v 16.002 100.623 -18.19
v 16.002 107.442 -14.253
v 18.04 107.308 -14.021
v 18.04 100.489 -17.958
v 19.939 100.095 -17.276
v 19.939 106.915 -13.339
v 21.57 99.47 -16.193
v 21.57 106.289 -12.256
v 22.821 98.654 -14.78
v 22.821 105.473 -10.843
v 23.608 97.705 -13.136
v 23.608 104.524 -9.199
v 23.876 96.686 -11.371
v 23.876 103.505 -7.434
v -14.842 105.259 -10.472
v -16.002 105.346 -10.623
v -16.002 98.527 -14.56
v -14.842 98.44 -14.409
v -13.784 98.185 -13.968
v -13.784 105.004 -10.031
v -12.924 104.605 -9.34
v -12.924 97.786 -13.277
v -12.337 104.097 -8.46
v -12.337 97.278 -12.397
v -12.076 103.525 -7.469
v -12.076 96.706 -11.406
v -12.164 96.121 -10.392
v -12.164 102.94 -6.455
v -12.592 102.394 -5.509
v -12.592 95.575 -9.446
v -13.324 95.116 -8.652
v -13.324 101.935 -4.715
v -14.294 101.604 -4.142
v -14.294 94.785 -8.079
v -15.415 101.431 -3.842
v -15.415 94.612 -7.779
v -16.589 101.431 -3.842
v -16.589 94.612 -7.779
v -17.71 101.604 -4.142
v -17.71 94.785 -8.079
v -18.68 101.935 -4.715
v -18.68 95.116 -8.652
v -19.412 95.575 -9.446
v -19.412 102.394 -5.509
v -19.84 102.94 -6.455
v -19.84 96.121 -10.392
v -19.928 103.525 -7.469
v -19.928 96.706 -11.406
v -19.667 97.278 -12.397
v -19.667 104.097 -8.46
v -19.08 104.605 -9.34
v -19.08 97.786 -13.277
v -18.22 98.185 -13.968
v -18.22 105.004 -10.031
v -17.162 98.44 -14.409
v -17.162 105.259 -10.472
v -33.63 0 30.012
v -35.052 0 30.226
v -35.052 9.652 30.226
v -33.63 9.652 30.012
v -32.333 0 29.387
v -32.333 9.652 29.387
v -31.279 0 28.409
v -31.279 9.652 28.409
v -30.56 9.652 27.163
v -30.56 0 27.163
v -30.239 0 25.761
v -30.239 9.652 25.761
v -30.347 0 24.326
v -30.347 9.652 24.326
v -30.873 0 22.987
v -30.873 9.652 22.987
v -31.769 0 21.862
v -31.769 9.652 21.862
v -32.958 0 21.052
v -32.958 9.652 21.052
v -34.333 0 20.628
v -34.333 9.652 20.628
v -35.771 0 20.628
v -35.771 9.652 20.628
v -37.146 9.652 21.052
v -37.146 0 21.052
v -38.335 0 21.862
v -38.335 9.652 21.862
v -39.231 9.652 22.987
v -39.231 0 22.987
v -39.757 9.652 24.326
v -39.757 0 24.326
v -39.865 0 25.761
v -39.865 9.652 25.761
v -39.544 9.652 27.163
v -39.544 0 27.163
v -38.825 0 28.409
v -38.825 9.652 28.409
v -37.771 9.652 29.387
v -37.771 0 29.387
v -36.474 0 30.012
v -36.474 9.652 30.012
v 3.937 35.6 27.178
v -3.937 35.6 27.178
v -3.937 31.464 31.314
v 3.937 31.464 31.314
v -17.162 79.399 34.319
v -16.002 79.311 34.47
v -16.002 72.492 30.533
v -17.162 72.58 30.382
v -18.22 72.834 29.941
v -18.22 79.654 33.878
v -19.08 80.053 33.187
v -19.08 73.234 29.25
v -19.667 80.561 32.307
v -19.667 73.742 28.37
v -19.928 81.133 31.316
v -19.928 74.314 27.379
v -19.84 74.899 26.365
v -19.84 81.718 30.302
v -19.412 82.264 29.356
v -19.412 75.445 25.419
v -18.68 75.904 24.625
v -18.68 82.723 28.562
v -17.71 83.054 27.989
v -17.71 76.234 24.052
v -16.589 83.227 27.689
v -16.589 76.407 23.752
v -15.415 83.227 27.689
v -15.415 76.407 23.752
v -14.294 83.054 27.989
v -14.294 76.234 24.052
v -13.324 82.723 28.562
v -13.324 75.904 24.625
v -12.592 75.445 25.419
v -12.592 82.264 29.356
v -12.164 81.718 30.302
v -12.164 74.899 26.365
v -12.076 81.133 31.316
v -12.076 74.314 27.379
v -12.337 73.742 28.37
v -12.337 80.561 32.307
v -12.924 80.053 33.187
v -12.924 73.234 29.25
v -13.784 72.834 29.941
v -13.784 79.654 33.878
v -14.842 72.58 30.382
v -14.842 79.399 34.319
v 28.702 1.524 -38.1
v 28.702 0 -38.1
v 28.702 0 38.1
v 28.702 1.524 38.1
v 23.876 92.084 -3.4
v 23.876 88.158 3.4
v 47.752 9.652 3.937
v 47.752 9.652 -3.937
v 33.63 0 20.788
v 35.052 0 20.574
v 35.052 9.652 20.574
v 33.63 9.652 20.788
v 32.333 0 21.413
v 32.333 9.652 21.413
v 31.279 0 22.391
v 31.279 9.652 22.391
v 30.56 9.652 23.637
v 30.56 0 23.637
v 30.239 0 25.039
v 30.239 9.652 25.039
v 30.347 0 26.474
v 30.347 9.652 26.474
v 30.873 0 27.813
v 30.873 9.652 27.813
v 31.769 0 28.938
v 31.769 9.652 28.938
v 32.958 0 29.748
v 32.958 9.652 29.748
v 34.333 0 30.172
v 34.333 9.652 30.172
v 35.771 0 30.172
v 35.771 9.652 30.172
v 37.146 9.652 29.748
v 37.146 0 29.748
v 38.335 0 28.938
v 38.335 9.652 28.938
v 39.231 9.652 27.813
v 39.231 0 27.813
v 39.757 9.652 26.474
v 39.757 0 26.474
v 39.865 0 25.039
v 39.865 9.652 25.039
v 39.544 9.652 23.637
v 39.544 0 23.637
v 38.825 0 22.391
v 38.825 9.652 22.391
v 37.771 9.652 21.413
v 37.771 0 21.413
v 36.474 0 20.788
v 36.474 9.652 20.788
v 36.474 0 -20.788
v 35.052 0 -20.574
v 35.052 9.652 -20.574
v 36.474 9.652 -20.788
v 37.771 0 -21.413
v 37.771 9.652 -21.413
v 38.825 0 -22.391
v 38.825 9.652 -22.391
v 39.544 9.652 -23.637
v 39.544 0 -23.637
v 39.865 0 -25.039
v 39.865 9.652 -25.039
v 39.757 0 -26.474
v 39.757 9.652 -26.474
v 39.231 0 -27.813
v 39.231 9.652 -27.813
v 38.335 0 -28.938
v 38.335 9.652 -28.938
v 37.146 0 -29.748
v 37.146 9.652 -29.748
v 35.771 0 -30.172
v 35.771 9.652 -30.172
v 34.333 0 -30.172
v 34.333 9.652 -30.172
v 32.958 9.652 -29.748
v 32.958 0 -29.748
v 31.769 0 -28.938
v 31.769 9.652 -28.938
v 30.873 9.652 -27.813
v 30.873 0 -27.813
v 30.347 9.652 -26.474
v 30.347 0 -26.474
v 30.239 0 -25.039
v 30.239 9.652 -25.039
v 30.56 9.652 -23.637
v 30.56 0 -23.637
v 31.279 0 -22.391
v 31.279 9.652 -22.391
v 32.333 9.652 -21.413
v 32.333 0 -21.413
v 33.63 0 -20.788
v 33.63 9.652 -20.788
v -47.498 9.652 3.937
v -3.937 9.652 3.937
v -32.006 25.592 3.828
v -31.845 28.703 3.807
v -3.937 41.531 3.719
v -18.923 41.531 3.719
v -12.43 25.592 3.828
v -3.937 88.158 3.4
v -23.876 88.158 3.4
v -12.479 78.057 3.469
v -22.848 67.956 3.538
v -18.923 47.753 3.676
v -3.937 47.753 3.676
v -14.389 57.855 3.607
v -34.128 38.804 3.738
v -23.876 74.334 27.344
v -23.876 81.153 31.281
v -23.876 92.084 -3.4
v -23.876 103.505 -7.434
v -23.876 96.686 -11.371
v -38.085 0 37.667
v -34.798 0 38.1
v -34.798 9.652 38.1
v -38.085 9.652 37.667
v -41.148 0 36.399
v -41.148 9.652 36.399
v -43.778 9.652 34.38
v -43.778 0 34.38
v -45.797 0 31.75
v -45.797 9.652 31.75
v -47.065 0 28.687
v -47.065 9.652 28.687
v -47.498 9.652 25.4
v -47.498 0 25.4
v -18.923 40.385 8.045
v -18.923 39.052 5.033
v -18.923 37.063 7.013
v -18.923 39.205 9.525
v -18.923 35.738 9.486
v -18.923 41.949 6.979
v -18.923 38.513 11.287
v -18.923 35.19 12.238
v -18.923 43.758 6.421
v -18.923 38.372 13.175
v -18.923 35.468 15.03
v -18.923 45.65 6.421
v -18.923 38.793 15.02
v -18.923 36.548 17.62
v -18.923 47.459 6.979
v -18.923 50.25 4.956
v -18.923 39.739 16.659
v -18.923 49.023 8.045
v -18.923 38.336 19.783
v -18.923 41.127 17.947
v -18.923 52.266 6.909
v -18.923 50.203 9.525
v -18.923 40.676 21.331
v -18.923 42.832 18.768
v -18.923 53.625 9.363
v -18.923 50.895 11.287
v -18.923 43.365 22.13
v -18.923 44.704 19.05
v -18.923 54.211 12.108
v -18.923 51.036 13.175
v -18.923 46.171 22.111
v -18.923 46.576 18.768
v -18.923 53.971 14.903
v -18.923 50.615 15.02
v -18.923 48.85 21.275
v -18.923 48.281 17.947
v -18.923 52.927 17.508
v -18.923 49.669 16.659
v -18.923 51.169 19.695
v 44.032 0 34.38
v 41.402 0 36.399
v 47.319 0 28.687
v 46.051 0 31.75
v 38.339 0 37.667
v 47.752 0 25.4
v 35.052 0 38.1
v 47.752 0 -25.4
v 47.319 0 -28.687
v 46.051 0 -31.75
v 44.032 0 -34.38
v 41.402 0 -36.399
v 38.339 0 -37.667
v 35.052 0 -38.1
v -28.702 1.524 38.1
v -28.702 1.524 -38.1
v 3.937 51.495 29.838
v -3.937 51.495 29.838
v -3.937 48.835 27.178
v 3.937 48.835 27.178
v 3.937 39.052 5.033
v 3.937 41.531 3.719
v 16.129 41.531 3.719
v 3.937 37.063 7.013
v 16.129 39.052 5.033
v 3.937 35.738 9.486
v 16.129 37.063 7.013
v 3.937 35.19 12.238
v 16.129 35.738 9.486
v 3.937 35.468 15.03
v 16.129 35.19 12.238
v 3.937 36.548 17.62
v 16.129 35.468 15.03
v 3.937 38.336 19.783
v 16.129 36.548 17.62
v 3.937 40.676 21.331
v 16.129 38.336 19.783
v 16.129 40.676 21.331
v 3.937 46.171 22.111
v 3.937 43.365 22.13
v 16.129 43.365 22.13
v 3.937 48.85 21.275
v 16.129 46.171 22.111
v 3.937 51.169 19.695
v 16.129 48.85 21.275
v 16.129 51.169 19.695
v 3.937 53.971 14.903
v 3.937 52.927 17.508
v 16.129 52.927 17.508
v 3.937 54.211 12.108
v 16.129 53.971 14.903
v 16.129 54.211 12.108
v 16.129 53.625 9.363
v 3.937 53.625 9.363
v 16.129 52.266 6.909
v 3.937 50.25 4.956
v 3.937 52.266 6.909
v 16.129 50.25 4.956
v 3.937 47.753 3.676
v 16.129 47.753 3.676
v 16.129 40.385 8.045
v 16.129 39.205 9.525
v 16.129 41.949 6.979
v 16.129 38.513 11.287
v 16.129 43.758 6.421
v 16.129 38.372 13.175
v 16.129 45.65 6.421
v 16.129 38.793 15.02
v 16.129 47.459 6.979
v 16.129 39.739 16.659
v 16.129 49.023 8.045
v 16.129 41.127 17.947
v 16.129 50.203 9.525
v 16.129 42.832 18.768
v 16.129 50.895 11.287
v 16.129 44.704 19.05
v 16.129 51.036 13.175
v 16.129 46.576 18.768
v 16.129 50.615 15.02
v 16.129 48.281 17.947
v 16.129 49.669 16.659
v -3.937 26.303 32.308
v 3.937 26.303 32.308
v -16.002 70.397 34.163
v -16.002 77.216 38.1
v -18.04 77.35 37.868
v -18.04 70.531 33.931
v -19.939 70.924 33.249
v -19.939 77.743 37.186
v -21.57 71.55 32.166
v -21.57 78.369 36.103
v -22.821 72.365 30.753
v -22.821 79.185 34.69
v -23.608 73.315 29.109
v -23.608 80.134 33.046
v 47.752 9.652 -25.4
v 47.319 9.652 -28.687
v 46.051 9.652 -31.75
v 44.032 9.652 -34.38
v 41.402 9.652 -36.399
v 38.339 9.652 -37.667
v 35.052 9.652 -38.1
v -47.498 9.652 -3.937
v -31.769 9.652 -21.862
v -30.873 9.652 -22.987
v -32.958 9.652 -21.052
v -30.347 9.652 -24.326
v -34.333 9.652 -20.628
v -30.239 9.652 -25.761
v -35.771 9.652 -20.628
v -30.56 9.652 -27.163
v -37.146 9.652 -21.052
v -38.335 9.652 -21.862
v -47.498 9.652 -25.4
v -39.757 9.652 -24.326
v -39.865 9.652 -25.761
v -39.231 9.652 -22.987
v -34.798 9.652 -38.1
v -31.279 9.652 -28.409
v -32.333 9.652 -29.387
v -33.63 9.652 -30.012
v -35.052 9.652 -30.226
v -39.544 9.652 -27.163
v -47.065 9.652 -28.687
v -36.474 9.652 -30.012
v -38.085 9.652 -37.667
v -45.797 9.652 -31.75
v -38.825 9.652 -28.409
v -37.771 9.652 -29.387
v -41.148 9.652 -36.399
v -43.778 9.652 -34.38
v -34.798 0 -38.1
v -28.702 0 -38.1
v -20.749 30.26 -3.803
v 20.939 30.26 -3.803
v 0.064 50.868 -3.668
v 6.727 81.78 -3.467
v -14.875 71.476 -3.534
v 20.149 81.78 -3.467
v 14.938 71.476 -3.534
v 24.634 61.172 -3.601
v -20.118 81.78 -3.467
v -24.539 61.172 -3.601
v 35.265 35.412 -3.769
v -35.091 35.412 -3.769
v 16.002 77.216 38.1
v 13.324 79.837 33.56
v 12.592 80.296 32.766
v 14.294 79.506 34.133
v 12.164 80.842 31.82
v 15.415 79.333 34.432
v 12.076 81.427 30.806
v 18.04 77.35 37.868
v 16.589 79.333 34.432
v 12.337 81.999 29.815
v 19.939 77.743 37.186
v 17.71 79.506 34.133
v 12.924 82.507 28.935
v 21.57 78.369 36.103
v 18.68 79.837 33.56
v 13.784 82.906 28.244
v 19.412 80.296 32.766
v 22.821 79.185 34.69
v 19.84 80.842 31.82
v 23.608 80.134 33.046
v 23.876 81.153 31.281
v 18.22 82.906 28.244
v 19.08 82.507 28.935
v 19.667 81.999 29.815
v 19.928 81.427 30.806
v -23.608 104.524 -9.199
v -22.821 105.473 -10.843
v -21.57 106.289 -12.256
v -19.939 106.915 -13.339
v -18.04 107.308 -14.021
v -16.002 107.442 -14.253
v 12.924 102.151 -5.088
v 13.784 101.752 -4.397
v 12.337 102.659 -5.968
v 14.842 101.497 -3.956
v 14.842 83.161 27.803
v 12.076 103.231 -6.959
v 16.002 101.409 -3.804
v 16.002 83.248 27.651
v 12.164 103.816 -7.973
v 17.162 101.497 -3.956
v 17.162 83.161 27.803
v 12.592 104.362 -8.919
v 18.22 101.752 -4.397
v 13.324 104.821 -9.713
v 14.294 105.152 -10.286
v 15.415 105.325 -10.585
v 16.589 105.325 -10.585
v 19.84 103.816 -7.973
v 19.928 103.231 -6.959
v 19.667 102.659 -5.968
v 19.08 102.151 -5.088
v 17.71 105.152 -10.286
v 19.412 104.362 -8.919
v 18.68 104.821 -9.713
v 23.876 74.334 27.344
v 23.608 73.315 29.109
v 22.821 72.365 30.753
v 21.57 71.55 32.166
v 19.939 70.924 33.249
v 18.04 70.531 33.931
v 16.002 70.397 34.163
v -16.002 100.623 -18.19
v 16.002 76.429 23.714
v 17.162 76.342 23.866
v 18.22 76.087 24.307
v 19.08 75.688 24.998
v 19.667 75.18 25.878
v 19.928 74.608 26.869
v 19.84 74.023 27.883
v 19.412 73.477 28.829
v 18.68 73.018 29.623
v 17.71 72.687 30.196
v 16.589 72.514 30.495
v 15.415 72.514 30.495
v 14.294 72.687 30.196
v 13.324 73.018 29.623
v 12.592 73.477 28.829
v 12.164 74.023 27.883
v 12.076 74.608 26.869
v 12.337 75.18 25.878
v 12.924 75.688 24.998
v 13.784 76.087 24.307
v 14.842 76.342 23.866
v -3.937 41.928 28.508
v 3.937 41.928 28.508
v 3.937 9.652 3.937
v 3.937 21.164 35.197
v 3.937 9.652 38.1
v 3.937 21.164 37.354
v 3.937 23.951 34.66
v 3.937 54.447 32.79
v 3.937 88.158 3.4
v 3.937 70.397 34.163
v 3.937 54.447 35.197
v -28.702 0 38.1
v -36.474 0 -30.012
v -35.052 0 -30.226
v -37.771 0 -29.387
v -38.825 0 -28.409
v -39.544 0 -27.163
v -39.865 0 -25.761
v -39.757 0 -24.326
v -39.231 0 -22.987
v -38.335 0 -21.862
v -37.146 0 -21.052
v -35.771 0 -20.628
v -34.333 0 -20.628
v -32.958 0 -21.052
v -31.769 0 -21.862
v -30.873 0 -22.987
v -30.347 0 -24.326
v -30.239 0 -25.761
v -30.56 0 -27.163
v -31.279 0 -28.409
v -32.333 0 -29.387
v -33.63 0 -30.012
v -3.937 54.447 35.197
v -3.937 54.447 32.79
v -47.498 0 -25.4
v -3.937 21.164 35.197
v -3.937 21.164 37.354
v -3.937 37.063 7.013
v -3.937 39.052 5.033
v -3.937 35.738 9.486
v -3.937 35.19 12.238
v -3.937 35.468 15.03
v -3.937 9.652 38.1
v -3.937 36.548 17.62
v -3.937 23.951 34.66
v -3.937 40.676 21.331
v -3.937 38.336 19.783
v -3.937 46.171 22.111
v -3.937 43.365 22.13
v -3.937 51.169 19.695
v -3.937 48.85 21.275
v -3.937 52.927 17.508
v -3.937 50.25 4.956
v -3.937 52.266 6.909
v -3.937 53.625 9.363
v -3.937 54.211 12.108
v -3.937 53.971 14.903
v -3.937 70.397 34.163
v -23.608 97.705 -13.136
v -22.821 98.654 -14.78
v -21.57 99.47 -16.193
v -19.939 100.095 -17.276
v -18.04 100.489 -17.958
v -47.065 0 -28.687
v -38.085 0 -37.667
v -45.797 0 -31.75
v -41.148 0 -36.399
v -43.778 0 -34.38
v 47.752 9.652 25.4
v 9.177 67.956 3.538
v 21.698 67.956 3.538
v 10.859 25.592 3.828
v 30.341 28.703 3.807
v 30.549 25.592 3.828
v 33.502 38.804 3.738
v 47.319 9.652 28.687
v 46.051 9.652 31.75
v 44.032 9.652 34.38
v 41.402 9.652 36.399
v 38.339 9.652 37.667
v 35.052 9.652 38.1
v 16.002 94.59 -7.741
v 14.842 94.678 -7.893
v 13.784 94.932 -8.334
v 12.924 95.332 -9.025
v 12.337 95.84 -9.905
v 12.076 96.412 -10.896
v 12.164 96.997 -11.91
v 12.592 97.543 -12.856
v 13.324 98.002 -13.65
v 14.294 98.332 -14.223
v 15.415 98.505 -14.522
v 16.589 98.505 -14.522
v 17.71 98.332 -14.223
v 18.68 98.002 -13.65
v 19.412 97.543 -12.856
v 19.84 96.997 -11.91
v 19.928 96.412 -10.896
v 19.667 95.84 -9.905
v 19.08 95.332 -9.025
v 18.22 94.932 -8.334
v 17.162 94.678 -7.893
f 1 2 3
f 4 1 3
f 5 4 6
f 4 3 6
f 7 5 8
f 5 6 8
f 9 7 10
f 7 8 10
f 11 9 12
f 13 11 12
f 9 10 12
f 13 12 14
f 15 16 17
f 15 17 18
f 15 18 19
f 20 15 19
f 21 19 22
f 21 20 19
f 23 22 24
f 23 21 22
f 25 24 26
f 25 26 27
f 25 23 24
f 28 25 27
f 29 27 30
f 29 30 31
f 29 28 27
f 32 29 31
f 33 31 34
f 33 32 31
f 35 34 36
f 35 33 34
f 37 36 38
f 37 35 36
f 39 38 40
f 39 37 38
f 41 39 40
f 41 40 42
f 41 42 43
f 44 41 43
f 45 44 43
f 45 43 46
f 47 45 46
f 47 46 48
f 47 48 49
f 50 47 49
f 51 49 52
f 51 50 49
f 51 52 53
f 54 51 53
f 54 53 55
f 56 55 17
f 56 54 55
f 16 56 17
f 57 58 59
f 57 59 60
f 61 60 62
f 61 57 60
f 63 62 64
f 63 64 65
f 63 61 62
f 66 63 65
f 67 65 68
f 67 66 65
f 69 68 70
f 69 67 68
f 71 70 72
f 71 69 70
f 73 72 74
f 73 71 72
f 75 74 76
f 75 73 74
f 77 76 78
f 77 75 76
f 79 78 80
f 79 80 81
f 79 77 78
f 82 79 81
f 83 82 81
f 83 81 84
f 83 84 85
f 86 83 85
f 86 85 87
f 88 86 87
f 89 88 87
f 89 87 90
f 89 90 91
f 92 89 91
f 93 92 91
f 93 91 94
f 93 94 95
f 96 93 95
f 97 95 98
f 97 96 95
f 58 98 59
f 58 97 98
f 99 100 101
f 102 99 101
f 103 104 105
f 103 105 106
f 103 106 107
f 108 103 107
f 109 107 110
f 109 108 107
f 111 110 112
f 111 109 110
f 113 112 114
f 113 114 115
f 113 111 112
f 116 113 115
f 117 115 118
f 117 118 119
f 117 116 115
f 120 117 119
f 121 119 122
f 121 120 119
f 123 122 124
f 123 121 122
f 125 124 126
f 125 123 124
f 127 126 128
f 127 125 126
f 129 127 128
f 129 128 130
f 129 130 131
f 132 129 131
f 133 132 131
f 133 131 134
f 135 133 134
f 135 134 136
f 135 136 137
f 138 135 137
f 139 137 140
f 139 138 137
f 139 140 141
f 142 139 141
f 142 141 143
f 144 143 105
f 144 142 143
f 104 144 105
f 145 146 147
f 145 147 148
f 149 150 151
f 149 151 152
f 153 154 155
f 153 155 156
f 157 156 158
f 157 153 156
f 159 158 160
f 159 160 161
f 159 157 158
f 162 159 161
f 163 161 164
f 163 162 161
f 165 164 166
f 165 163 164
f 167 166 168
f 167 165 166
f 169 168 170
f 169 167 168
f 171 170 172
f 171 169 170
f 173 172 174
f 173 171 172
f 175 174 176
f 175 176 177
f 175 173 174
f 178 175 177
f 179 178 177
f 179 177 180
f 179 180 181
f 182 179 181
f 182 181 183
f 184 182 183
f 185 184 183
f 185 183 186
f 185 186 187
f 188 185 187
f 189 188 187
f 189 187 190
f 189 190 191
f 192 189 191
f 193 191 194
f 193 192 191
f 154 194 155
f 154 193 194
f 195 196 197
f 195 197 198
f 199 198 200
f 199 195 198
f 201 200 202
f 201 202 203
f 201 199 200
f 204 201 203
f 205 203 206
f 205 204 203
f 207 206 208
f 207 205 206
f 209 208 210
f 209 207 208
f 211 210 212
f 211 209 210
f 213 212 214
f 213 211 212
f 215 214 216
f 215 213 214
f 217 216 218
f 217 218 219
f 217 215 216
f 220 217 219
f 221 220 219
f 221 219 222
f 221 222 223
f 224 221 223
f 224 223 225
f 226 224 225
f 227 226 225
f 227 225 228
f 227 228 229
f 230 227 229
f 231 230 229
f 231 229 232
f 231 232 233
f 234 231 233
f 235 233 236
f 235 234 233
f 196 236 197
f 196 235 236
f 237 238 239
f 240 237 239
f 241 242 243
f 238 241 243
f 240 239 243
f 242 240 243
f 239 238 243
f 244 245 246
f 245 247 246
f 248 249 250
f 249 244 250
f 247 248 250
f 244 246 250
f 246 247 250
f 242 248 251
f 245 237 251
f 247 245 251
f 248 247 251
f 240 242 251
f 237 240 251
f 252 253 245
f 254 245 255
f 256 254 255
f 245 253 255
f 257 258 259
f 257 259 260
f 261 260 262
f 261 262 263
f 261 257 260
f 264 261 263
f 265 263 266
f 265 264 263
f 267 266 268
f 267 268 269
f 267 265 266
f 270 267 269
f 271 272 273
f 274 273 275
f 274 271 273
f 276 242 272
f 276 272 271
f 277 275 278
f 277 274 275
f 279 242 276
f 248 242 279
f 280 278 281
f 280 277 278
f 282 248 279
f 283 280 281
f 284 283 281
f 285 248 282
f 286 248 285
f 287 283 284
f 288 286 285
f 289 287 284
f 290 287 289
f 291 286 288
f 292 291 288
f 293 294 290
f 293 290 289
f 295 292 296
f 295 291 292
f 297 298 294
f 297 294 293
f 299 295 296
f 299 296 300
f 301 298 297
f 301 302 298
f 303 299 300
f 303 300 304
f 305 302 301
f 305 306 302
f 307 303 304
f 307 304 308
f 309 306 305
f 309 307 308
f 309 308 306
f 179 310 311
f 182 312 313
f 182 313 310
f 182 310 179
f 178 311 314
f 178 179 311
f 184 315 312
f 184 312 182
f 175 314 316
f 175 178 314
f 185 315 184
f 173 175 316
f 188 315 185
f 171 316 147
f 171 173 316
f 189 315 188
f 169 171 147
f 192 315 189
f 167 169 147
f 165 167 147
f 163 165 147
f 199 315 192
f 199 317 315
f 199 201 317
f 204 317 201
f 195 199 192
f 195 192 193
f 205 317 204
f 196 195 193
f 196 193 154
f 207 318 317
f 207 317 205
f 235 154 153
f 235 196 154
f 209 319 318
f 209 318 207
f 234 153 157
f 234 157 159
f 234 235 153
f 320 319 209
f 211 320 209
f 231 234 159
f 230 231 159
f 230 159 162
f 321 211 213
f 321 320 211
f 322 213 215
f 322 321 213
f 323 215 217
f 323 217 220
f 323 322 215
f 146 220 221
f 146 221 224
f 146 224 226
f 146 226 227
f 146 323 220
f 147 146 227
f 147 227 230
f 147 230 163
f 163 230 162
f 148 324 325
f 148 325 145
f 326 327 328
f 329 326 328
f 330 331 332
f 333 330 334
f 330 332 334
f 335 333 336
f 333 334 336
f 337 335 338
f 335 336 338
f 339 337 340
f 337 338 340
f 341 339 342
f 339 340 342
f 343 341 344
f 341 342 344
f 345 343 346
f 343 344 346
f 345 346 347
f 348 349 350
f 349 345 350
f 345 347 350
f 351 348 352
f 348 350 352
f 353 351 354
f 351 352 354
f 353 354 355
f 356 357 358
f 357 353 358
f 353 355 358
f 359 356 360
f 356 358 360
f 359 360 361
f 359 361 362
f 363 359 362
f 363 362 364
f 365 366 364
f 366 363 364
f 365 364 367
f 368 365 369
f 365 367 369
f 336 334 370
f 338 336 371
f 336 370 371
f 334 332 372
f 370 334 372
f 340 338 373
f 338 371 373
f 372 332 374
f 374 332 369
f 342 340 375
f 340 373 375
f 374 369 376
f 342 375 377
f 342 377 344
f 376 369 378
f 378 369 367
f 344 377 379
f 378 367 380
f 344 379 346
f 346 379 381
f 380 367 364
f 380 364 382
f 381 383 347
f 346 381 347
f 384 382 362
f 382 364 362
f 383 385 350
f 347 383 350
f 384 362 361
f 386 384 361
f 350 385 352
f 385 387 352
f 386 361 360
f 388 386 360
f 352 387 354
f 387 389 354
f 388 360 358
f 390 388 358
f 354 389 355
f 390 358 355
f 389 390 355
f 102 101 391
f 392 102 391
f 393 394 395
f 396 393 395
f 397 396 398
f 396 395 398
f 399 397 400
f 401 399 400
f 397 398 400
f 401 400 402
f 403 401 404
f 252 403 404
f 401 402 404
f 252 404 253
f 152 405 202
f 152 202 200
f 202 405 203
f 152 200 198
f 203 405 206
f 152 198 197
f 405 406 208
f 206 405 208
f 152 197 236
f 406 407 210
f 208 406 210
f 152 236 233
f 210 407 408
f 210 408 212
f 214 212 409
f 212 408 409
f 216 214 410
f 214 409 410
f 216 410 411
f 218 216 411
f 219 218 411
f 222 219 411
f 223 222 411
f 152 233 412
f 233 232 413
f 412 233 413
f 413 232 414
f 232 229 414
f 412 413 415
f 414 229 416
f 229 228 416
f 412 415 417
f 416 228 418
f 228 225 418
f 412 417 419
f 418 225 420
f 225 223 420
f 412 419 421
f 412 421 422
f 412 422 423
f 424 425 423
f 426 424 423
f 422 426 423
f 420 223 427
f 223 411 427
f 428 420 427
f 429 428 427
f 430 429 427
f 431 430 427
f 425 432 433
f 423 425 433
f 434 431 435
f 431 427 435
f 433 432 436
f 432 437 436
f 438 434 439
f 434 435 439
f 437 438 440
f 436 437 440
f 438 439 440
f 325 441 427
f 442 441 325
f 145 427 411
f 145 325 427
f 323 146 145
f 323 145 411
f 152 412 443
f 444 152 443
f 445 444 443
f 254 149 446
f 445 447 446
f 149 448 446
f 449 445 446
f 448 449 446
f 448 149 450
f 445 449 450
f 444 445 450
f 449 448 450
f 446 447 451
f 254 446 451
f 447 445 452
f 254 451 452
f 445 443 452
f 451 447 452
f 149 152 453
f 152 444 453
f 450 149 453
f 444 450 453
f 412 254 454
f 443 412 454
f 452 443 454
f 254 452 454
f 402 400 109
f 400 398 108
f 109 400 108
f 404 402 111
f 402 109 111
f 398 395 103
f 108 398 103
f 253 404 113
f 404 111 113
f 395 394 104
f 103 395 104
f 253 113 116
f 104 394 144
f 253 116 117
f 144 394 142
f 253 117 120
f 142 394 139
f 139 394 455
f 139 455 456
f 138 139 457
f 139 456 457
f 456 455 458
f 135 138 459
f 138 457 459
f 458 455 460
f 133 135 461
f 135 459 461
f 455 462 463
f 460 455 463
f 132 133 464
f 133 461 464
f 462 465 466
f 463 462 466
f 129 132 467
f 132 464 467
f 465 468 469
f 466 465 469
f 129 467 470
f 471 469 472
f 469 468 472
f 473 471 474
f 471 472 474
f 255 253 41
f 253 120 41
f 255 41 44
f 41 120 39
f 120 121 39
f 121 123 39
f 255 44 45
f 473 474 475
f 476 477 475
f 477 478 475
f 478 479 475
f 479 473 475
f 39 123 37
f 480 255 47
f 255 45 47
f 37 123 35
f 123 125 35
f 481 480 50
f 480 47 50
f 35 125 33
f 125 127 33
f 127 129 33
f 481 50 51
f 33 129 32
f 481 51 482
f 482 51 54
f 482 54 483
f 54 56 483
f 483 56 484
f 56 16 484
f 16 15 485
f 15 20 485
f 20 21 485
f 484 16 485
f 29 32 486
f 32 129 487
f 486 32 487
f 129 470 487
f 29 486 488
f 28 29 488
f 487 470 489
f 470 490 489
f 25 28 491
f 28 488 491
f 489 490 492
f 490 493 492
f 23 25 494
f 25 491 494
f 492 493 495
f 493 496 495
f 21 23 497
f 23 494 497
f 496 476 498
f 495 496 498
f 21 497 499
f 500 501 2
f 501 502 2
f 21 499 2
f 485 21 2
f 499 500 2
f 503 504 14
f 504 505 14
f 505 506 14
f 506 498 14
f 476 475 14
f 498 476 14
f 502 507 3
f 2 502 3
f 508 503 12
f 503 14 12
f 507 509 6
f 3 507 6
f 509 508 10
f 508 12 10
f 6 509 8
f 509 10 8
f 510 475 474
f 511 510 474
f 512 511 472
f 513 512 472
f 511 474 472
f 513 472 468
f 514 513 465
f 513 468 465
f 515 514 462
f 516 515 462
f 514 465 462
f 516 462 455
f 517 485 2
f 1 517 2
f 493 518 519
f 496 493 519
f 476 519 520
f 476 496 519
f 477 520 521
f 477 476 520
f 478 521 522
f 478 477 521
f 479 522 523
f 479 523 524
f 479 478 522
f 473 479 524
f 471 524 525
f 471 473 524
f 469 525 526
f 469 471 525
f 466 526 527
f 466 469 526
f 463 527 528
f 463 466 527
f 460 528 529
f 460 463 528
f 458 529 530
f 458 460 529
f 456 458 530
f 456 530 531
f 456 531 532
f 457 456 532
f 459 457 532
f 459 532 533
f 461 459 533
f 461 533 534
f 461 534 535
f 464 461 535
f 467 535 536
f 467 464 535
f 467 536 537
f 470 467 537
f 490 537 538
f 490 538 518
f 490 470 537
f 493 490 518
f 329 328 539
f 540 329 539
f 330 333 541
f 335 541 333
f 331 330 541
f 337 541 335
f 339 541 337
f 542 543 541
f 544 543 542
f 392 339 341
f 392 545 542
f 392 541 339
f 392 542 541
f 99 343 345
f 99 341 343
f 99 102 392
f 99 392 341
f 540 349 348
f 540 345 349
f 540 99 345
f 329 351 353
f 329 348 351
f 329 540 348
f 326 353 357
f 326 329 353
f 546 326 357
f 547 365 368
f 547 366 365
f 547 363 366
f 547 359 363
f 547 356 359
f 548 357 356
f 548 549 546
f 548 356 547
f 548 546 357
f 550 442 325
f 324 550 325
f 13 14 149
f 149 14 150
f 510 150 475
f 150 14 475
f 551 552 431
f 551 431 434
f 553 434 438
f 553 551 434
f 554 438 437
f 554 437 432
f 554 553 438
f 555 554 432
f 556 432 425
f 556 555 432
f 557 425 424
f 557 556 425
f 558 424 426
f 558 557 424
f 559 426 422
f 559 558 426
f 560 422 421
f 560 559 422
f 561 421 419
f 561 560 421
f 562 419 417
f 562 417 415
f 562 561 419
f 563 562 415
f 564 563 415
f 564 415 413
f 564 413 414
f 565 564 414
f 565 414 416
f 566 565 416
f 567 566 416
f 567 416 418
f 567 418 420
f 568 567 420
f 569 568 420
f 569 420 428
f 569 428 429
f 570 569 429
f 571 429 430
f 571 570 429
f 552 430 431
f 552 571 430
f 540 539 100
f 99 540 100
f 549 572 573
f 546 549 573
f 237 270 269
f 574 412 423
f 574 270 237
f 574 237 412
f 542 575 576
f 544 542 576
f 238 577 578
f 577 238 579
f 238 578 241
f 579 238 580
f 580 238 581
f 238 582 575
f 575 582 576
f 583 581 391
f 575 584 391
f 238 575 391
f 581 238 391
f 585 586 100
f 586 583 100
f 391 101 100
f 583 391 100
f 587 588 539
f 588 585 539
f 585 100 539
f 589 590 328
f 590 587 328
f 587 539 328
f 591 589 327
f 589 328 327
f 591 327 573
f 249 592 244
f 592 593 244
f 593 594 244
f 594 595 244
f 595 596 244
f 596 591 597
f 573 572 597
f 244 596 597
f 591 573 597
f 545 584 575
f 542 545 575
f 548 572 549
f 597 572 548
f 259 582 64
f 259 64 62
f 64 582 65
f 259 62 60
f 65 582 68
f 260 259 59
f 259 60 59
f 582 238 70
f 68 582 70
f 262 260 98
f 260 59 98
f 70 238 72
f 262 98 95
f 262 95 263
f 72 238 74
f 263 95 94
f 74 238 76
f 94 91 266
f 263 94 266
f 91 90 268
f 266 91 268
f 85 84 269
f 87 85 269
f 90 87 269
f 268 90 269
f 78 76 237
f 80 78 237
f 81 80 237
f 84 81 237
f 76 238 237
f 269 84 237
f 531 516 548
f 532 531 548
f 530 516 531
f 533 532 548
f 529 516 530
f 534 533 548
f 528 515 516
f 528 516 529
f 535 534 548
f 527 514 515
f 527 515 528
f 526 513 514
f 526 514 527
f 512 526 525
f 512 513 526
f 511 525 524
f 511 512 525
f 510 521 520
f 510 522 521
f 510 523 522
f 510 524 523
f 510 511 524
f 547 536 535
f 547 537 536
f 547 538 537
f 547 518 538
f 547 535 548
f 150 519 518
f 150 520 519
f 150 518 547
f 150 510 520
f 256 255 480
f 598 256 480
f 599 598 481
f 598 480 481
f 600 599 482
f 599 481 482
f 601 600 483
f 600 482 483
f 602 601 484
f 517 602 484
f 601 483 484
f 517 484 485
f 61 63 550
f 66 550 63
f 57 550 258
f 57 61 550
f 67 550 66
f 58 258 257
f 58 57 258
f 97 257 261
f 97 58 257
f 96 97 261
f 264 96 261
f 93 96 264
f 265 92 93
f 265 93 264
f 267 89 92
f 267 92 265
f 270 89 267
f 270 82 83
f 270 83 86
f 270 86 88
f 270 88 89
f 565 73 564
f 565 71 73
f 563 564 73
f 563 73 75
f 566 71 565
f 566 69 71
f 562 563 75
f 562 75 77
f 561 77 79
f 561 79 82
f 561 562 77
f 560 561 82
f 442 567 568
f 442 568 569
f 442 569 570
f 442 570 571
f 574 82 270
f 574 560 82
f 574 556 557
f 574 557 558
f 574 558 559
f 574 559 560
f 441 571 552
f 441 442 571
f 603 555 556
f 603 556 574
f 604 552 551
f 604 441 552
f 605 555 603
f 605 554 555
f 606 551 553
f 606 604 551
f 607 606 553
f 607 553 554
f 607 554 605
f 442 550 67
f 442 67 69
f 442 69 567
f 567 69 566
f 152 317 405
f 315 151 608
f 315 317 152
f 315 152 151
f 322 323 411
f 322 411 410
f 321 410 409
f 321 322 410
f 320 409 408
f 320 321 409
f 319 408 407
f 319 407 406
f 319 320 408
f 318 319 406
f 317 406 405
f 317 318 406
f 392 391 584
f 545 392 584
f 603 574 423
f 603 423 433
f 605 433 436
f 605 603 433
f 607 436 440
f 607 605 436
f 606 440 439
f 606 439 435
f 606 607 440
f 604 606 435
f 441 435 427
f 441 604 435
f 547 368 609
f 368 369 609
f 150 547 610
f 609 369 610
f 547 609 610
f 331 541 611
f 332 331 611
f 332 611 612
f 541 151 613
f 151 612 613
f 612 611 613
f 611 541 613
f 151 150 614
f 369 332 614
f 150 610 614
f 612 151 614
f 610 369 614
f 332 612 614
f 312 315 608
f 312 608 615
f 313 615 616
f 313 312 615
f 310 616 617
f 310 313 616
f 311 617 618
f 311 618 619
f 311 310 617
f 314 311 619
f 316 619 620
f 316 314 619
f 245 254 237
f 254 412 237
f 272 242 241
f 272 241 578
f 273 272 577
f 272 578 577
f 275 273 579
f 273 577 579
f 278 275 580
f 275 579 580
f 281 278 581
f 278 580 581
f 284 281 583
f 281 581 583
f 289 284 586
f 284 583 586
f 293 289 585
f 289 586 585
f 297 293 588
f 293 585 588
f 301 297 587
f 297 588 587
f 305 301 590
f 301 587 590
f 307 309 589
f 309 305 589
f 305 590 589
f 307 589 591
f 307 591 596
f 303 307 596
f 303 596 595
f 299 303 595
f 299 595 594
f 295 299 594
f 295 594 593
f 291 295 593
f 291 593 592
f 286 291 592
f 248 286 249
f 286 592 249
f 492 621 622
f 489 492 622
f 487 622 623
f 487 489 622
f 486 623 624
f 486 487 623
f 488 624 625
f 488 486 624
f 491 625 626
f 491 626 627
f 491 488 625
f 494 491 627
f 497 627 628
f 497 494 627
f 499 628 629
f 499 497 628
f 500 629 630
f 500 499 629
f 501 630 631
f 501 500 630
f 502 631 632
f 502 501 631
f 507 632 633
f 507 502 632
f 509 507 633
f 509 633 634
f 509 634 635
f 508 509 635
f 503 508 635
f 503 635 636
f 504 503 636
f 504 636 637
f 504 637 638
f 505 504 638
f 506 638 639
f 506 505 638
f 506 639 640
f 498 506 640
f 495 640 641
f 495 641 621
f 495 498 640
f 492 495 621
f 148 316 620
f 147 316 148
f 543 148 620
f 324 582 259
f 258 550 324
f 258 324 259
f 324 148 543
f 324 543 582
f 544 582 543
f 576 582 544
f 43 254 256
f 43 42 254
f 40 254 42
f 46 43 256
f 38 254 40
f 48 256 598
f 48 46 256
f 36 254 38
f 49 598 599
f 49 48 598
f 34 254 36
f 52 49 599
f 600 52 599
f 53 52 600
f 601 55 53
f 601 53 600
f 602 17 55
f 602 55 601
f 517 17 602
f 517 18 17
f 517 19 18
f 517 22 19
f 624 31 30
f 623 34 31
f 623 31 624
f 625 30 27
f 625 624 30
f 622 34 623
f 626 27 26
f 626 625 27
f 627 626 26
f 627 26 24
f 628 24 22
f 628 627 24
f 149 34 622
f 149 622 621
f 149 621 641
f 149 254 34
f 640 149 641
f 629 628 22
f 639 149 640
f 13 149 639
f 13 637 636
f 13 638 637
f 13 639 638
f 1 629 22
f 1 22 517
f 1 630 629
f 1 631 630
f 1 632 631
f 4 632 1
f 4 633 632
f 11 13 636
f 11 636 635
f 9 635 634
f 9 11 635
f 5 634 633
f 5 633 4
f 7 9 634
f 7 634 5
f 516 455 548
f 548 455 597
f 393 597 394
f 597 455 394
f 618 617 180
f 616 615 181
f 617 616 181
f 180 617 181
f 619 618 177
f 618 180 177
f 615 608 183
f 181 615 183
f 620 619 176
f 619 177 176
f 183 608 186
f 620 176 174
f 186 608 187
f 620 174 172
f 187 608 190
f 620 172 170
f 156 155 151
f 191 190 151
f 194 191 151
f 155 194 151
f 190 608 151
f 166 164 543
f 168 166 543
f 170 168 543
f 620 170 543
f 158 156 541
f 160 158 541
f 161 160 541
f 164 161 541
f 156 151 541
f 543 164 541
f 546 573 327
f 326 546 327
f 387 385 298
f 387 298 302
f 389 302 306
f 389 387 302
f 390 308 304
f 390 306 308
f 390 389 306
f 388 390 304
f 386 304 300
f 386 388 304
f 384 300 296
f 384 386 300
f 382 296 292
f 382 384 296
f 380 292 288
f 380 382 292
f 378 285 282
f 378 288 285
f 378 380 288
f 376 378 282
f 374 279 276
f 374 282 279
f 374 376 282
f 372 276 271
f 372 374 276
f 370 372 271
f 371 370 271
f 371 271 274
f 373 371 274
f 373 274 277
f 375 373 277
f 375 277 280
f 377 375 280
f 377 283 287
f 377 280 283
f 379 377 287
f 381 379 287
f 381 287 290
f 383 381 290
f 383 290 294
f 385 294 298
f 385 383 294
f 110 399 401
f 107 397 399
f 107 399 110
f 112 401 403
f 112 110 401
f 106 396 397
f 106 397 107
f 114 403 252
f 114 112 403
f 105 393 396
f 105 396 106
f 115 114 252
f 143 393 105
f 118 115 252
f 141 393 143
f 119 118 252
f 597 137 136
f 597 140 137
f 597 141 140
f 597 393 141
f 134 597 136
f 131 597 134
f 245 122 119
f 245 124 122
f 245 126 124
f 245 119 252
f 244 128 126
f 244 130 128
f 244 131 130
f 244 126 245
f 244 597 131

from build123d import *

# Parameters (mm, degrees)
SKETCH2_R                = 4.826
BOSS_EXTRUDE1_DEPTH      = 9.652
CUT_EXTRUDE1_REACH       = 92.443
SKETCH4_W                = 57.404
SKETCH4_H                = 1.524
SKETCH7_R                = 3.937
BOSS_EXTRUDE2_DEPTH      = 7.874
RIB1_REACH               = 125.595
SKETCH11_WALL_W          = 310.061740512
SKETCH11_WALL_H          = 7.874
BOSS_EXTRUDE3_DEPTH      = 14.986
BOSS_EXTRUDE3_DEPTH_BACK = 20.066
SKETCH12_R               = 9.525
CUT_EXTRUDE2_DEPTH       = 126.168470882
CUT_EXTRUDE2_DEPTH_BACK  = 126.168470882
SKETCH12_3_R             = 6.35
CUT_EXTRUDE3_REACH       = 127.168


with BuildPart() as part:
    # Sketch2 → Boss-Extrude1 (new body)
    with BuildSketch(Plane(origin=(0, 0, 0), x_dir=(1, 0, 0), z_dir=(0, 1, 0))):
        with BuildLine():
            Line((35.052, -38.1), (-34.798, -38.1))
            ThreePointArc((-34.798, -38.1), (-43.778256121, -34.380256121), (-47.498, -25.4))
            Line((-47.498, -25.4), (-47.498, 25.4))
            ThreePointArc((-47.498, 25.4), (-43.778256121, 34.380256121), (-34.798, 38.1))
            Line((-34.798, 38.1), (35.052, 38.1))
            ThreePointArc((35.052, 38.1), (44.032256121, 34.380256121), (47.752, 25.4))
            Line((47.752, 25.4), (47.752, -25.4))
            ThreePointArc((47.752, -25.4), (44.032256121, -34.380256121), (35.052, -38.1))
        make_face()
        with Locations((35.052, 25.4)):
            Circle(SKETCH2_R, mode=Mode.SUBTRACT)
        with Locations((35.052, -25.4)):
            Circle(SKETCH2_R, mode=Mode.SUBTRACT)
        with Locations((-35.052, -25.4)):
            Circle(SKETCH2_R, mode=Mode.SUBTRACT)
        with Locations((-35.052, 25.4)):
            Circle(SKETCH2_R, mode=Mode.SUBTRACT)
    extrude(amount=BOSS_EXTRUDE1_DEPTH)

    # Sketch4 → Cut-Extrude1 (cut, up to next)
    with BuildSketch(Plane.XY.offset(38.1), mode=Mode.PRIVATE) as cut_extrude1_sk1:
        with Locations((0, 0.762)):
            Rectangle(SKETCH4_W, SKETCH4_H)
    cut_extrude1_tool1 = extrude(cut_extrude1_sk1.sketch, amount=-CUT_EXTRUDE1_REACH, mode=Mode.PRIVATE) & part.part
    add(cut_extrude1_tool1.solids().sort_by_distance((0, 0.762, 38.1))[0], mode=Mode.SUBTRACT)



with BuildPart() as body_2:
    # Sketch7 → Boss-Extrude2 (new body)
    with BuildSketch(Plane(origin=(0, 74.409783942, 42.960508789), x_dir=(0, 0.499999999999998, -0.8660254037844398), z_dir=(0, -0.8660254037844398, -0.499999999999998))):
        with BuildLine():
            Line((13.486432116, -23.876), (58.190432116, -23.876))
            ThreePointArc((58.190432116, -23.876), (63.758190911, -21.569758795), (66.064432116, -16.002))
            Line((66.064432116, -16.002), (66.064432116, 16.002))
            ThreePointArc((66.064432116, 16.002), (63.758190911, 21.569758795), (58.190432116, 23.876))
            Line((58.190432116, 23.876), (13.486432116, 23.876))
            ThreePointArc((13.486432116, 23.876), (7.918673321, 21.569758795), (5.612432116, 16.002))
            Line((5.612432116, 16.002), (5.612432116, -16.002))
            ThreePointArc((5.612432116, -16.002), (7.918673321, -21.569758795), (13.486432116, -23.876))
        make_face()
        with Locations((13.740432116, 16.002)):
            Circle(SKETCH7_R, mode=Mode.SUBTRACT)
        with Locations((13.740432116, -16.002)):
            Circle(SKETCH7_R, mode=Mode.SUBTRACT)
        with Locations((57.936432116, -16.002)):
            Circle(SKETCH7_R, mode=Mode.SUBTRACT)
        with Locations((57.936432116, 16.002)):
            Circle(SKETCH7_R, mode=Mode.SUBTRACT)
    extrude(amount=BOSS_EXTRUDE2_DEPTH)


with BuildPart() as part_1:
    add(part.part)

    add(body_2.part)  # Loft1 merges body 2
    # Sketch10 → Loft1 section 0
    with BuildSketch(Plane(origin=(0, 67.590699913, 39.023508789), x_dir=(1, 0, 0), z_dir=(0, -0.8660254037844398, -0.49999999999999806))):
        with BuildLine():
            Line((23.876, -48.986339597), (-23.876, -48.986339597))
            Line((-23.876, -48.986339597), (-23.876, -41.13459362))
            Line((-23.876, -41.13459362), (23.876, -41.13459362))
            Line((23.876, -41.13459362), (23.876, -48.986339597))
        make_face()
    # Sketch8 → Loft1 section 1
    with BuildSketch(Plane(origin=(0, 9.652, 0), x_dir=(1, 0, 0), z_dir=(0, 1, 0))):
        with BuildLine():
            Line((47.752, -3.937), (-47.498, -3.937))
            Line((-47.498, -3.937), (-47.498, 3.937))
            Line((-47.498, 3.937), (47.752, 3.937))
            Line((47.752, 3.937), (47.752, -3.937))
        make_face()
    loft()

    # Sketch11 wall → Rib1 (add, up to next)
    with BuildSketch(Plane(origin=(0, 40.024457985, 36.1315), x_dir=(0, 0.997906295589, -0.064676311144), z_dir=(0, 0.064676311144, 0.997906295589)), mode=Mode.PRIVATE) as rib1_sk1:
        Rectangle(SKETCH11_WALL_W, SKETCH11_WALL_H)
    rib1_tool1 = extrude(rib1_sk1.sketch, amount=-RIB1_REACH, mode=Mode.PRIVATE) - part_1.part
    add(rib1_tool1.solids().sort_by_distance((0, 40.024457985, 36.1315))[0])

    # Sketch12 → Boss-Extrude3 (add, two sides: drawn at the far end of the back side and taken through both)
    with BuildSketch(Plane.ZY.offset(3.937).offset(-BOSS_EXTRUDE3_DEPTH_BACK)):
        with Locations((12.7, 44.704)):
            Circle(SKETCH12_R)
    extrude(amount=BOSS_EXTRUDE3_DEPTH + BOSS_EXTRUDE3_DEPTH_BACK)

    # Sketch12<3> → Cut-Extrude2 (cut, two sides: drawn at the far end of the back side and taken through both)
    with BuildSketch(Plane.ZY.offset(3.937).offset(-CUT_EXTRUDE2_DEPTH_BACK)):
        with Locations((12.7, 44.704)):
            Circle(SKETCH12_3_R)
    extrude(amount=CUT_EXTRUDE2_DEPTH + CUT_EXTRUDE2_DEPTH_BACK, mode=Mode.SUBTRACT)

    # Sketch13 → Cut-Extrude3 (cut, up to next)
    with BuildSketch(Plane.ZY.offset(3.937), mode=Mode.PRIVATE) as cut_extrude3_sk1:
        Polygon((32.789961939, 54.446931247), (29.83831511, 51.495284418), (27.177726093, 48.8346954), (28.508020602, 41.928118952), (27.177726093, 35.60023156), (31.314138525, 31.463819128), (32.308134502, 26.303225622), (34.659879511, 23.951480612), (35.196750543, 21.164172387), (41.131268047, 21.164172387), (39.117849331, 54.446931247), align=None)
    cut_extrude3_tool1 = extrude(cut_extrude3_sk1.sketch, amount=-CUT_EXTRUDE3_REACH, mode=Mode.PRIVATE) & part_1.part
    add(cut_extrude3_tool1.solids().sort_by_distance((-3.937, 38.754988, 34.773506))[0], mode=Mode.SUBTRACT)


solid = part_1.part
